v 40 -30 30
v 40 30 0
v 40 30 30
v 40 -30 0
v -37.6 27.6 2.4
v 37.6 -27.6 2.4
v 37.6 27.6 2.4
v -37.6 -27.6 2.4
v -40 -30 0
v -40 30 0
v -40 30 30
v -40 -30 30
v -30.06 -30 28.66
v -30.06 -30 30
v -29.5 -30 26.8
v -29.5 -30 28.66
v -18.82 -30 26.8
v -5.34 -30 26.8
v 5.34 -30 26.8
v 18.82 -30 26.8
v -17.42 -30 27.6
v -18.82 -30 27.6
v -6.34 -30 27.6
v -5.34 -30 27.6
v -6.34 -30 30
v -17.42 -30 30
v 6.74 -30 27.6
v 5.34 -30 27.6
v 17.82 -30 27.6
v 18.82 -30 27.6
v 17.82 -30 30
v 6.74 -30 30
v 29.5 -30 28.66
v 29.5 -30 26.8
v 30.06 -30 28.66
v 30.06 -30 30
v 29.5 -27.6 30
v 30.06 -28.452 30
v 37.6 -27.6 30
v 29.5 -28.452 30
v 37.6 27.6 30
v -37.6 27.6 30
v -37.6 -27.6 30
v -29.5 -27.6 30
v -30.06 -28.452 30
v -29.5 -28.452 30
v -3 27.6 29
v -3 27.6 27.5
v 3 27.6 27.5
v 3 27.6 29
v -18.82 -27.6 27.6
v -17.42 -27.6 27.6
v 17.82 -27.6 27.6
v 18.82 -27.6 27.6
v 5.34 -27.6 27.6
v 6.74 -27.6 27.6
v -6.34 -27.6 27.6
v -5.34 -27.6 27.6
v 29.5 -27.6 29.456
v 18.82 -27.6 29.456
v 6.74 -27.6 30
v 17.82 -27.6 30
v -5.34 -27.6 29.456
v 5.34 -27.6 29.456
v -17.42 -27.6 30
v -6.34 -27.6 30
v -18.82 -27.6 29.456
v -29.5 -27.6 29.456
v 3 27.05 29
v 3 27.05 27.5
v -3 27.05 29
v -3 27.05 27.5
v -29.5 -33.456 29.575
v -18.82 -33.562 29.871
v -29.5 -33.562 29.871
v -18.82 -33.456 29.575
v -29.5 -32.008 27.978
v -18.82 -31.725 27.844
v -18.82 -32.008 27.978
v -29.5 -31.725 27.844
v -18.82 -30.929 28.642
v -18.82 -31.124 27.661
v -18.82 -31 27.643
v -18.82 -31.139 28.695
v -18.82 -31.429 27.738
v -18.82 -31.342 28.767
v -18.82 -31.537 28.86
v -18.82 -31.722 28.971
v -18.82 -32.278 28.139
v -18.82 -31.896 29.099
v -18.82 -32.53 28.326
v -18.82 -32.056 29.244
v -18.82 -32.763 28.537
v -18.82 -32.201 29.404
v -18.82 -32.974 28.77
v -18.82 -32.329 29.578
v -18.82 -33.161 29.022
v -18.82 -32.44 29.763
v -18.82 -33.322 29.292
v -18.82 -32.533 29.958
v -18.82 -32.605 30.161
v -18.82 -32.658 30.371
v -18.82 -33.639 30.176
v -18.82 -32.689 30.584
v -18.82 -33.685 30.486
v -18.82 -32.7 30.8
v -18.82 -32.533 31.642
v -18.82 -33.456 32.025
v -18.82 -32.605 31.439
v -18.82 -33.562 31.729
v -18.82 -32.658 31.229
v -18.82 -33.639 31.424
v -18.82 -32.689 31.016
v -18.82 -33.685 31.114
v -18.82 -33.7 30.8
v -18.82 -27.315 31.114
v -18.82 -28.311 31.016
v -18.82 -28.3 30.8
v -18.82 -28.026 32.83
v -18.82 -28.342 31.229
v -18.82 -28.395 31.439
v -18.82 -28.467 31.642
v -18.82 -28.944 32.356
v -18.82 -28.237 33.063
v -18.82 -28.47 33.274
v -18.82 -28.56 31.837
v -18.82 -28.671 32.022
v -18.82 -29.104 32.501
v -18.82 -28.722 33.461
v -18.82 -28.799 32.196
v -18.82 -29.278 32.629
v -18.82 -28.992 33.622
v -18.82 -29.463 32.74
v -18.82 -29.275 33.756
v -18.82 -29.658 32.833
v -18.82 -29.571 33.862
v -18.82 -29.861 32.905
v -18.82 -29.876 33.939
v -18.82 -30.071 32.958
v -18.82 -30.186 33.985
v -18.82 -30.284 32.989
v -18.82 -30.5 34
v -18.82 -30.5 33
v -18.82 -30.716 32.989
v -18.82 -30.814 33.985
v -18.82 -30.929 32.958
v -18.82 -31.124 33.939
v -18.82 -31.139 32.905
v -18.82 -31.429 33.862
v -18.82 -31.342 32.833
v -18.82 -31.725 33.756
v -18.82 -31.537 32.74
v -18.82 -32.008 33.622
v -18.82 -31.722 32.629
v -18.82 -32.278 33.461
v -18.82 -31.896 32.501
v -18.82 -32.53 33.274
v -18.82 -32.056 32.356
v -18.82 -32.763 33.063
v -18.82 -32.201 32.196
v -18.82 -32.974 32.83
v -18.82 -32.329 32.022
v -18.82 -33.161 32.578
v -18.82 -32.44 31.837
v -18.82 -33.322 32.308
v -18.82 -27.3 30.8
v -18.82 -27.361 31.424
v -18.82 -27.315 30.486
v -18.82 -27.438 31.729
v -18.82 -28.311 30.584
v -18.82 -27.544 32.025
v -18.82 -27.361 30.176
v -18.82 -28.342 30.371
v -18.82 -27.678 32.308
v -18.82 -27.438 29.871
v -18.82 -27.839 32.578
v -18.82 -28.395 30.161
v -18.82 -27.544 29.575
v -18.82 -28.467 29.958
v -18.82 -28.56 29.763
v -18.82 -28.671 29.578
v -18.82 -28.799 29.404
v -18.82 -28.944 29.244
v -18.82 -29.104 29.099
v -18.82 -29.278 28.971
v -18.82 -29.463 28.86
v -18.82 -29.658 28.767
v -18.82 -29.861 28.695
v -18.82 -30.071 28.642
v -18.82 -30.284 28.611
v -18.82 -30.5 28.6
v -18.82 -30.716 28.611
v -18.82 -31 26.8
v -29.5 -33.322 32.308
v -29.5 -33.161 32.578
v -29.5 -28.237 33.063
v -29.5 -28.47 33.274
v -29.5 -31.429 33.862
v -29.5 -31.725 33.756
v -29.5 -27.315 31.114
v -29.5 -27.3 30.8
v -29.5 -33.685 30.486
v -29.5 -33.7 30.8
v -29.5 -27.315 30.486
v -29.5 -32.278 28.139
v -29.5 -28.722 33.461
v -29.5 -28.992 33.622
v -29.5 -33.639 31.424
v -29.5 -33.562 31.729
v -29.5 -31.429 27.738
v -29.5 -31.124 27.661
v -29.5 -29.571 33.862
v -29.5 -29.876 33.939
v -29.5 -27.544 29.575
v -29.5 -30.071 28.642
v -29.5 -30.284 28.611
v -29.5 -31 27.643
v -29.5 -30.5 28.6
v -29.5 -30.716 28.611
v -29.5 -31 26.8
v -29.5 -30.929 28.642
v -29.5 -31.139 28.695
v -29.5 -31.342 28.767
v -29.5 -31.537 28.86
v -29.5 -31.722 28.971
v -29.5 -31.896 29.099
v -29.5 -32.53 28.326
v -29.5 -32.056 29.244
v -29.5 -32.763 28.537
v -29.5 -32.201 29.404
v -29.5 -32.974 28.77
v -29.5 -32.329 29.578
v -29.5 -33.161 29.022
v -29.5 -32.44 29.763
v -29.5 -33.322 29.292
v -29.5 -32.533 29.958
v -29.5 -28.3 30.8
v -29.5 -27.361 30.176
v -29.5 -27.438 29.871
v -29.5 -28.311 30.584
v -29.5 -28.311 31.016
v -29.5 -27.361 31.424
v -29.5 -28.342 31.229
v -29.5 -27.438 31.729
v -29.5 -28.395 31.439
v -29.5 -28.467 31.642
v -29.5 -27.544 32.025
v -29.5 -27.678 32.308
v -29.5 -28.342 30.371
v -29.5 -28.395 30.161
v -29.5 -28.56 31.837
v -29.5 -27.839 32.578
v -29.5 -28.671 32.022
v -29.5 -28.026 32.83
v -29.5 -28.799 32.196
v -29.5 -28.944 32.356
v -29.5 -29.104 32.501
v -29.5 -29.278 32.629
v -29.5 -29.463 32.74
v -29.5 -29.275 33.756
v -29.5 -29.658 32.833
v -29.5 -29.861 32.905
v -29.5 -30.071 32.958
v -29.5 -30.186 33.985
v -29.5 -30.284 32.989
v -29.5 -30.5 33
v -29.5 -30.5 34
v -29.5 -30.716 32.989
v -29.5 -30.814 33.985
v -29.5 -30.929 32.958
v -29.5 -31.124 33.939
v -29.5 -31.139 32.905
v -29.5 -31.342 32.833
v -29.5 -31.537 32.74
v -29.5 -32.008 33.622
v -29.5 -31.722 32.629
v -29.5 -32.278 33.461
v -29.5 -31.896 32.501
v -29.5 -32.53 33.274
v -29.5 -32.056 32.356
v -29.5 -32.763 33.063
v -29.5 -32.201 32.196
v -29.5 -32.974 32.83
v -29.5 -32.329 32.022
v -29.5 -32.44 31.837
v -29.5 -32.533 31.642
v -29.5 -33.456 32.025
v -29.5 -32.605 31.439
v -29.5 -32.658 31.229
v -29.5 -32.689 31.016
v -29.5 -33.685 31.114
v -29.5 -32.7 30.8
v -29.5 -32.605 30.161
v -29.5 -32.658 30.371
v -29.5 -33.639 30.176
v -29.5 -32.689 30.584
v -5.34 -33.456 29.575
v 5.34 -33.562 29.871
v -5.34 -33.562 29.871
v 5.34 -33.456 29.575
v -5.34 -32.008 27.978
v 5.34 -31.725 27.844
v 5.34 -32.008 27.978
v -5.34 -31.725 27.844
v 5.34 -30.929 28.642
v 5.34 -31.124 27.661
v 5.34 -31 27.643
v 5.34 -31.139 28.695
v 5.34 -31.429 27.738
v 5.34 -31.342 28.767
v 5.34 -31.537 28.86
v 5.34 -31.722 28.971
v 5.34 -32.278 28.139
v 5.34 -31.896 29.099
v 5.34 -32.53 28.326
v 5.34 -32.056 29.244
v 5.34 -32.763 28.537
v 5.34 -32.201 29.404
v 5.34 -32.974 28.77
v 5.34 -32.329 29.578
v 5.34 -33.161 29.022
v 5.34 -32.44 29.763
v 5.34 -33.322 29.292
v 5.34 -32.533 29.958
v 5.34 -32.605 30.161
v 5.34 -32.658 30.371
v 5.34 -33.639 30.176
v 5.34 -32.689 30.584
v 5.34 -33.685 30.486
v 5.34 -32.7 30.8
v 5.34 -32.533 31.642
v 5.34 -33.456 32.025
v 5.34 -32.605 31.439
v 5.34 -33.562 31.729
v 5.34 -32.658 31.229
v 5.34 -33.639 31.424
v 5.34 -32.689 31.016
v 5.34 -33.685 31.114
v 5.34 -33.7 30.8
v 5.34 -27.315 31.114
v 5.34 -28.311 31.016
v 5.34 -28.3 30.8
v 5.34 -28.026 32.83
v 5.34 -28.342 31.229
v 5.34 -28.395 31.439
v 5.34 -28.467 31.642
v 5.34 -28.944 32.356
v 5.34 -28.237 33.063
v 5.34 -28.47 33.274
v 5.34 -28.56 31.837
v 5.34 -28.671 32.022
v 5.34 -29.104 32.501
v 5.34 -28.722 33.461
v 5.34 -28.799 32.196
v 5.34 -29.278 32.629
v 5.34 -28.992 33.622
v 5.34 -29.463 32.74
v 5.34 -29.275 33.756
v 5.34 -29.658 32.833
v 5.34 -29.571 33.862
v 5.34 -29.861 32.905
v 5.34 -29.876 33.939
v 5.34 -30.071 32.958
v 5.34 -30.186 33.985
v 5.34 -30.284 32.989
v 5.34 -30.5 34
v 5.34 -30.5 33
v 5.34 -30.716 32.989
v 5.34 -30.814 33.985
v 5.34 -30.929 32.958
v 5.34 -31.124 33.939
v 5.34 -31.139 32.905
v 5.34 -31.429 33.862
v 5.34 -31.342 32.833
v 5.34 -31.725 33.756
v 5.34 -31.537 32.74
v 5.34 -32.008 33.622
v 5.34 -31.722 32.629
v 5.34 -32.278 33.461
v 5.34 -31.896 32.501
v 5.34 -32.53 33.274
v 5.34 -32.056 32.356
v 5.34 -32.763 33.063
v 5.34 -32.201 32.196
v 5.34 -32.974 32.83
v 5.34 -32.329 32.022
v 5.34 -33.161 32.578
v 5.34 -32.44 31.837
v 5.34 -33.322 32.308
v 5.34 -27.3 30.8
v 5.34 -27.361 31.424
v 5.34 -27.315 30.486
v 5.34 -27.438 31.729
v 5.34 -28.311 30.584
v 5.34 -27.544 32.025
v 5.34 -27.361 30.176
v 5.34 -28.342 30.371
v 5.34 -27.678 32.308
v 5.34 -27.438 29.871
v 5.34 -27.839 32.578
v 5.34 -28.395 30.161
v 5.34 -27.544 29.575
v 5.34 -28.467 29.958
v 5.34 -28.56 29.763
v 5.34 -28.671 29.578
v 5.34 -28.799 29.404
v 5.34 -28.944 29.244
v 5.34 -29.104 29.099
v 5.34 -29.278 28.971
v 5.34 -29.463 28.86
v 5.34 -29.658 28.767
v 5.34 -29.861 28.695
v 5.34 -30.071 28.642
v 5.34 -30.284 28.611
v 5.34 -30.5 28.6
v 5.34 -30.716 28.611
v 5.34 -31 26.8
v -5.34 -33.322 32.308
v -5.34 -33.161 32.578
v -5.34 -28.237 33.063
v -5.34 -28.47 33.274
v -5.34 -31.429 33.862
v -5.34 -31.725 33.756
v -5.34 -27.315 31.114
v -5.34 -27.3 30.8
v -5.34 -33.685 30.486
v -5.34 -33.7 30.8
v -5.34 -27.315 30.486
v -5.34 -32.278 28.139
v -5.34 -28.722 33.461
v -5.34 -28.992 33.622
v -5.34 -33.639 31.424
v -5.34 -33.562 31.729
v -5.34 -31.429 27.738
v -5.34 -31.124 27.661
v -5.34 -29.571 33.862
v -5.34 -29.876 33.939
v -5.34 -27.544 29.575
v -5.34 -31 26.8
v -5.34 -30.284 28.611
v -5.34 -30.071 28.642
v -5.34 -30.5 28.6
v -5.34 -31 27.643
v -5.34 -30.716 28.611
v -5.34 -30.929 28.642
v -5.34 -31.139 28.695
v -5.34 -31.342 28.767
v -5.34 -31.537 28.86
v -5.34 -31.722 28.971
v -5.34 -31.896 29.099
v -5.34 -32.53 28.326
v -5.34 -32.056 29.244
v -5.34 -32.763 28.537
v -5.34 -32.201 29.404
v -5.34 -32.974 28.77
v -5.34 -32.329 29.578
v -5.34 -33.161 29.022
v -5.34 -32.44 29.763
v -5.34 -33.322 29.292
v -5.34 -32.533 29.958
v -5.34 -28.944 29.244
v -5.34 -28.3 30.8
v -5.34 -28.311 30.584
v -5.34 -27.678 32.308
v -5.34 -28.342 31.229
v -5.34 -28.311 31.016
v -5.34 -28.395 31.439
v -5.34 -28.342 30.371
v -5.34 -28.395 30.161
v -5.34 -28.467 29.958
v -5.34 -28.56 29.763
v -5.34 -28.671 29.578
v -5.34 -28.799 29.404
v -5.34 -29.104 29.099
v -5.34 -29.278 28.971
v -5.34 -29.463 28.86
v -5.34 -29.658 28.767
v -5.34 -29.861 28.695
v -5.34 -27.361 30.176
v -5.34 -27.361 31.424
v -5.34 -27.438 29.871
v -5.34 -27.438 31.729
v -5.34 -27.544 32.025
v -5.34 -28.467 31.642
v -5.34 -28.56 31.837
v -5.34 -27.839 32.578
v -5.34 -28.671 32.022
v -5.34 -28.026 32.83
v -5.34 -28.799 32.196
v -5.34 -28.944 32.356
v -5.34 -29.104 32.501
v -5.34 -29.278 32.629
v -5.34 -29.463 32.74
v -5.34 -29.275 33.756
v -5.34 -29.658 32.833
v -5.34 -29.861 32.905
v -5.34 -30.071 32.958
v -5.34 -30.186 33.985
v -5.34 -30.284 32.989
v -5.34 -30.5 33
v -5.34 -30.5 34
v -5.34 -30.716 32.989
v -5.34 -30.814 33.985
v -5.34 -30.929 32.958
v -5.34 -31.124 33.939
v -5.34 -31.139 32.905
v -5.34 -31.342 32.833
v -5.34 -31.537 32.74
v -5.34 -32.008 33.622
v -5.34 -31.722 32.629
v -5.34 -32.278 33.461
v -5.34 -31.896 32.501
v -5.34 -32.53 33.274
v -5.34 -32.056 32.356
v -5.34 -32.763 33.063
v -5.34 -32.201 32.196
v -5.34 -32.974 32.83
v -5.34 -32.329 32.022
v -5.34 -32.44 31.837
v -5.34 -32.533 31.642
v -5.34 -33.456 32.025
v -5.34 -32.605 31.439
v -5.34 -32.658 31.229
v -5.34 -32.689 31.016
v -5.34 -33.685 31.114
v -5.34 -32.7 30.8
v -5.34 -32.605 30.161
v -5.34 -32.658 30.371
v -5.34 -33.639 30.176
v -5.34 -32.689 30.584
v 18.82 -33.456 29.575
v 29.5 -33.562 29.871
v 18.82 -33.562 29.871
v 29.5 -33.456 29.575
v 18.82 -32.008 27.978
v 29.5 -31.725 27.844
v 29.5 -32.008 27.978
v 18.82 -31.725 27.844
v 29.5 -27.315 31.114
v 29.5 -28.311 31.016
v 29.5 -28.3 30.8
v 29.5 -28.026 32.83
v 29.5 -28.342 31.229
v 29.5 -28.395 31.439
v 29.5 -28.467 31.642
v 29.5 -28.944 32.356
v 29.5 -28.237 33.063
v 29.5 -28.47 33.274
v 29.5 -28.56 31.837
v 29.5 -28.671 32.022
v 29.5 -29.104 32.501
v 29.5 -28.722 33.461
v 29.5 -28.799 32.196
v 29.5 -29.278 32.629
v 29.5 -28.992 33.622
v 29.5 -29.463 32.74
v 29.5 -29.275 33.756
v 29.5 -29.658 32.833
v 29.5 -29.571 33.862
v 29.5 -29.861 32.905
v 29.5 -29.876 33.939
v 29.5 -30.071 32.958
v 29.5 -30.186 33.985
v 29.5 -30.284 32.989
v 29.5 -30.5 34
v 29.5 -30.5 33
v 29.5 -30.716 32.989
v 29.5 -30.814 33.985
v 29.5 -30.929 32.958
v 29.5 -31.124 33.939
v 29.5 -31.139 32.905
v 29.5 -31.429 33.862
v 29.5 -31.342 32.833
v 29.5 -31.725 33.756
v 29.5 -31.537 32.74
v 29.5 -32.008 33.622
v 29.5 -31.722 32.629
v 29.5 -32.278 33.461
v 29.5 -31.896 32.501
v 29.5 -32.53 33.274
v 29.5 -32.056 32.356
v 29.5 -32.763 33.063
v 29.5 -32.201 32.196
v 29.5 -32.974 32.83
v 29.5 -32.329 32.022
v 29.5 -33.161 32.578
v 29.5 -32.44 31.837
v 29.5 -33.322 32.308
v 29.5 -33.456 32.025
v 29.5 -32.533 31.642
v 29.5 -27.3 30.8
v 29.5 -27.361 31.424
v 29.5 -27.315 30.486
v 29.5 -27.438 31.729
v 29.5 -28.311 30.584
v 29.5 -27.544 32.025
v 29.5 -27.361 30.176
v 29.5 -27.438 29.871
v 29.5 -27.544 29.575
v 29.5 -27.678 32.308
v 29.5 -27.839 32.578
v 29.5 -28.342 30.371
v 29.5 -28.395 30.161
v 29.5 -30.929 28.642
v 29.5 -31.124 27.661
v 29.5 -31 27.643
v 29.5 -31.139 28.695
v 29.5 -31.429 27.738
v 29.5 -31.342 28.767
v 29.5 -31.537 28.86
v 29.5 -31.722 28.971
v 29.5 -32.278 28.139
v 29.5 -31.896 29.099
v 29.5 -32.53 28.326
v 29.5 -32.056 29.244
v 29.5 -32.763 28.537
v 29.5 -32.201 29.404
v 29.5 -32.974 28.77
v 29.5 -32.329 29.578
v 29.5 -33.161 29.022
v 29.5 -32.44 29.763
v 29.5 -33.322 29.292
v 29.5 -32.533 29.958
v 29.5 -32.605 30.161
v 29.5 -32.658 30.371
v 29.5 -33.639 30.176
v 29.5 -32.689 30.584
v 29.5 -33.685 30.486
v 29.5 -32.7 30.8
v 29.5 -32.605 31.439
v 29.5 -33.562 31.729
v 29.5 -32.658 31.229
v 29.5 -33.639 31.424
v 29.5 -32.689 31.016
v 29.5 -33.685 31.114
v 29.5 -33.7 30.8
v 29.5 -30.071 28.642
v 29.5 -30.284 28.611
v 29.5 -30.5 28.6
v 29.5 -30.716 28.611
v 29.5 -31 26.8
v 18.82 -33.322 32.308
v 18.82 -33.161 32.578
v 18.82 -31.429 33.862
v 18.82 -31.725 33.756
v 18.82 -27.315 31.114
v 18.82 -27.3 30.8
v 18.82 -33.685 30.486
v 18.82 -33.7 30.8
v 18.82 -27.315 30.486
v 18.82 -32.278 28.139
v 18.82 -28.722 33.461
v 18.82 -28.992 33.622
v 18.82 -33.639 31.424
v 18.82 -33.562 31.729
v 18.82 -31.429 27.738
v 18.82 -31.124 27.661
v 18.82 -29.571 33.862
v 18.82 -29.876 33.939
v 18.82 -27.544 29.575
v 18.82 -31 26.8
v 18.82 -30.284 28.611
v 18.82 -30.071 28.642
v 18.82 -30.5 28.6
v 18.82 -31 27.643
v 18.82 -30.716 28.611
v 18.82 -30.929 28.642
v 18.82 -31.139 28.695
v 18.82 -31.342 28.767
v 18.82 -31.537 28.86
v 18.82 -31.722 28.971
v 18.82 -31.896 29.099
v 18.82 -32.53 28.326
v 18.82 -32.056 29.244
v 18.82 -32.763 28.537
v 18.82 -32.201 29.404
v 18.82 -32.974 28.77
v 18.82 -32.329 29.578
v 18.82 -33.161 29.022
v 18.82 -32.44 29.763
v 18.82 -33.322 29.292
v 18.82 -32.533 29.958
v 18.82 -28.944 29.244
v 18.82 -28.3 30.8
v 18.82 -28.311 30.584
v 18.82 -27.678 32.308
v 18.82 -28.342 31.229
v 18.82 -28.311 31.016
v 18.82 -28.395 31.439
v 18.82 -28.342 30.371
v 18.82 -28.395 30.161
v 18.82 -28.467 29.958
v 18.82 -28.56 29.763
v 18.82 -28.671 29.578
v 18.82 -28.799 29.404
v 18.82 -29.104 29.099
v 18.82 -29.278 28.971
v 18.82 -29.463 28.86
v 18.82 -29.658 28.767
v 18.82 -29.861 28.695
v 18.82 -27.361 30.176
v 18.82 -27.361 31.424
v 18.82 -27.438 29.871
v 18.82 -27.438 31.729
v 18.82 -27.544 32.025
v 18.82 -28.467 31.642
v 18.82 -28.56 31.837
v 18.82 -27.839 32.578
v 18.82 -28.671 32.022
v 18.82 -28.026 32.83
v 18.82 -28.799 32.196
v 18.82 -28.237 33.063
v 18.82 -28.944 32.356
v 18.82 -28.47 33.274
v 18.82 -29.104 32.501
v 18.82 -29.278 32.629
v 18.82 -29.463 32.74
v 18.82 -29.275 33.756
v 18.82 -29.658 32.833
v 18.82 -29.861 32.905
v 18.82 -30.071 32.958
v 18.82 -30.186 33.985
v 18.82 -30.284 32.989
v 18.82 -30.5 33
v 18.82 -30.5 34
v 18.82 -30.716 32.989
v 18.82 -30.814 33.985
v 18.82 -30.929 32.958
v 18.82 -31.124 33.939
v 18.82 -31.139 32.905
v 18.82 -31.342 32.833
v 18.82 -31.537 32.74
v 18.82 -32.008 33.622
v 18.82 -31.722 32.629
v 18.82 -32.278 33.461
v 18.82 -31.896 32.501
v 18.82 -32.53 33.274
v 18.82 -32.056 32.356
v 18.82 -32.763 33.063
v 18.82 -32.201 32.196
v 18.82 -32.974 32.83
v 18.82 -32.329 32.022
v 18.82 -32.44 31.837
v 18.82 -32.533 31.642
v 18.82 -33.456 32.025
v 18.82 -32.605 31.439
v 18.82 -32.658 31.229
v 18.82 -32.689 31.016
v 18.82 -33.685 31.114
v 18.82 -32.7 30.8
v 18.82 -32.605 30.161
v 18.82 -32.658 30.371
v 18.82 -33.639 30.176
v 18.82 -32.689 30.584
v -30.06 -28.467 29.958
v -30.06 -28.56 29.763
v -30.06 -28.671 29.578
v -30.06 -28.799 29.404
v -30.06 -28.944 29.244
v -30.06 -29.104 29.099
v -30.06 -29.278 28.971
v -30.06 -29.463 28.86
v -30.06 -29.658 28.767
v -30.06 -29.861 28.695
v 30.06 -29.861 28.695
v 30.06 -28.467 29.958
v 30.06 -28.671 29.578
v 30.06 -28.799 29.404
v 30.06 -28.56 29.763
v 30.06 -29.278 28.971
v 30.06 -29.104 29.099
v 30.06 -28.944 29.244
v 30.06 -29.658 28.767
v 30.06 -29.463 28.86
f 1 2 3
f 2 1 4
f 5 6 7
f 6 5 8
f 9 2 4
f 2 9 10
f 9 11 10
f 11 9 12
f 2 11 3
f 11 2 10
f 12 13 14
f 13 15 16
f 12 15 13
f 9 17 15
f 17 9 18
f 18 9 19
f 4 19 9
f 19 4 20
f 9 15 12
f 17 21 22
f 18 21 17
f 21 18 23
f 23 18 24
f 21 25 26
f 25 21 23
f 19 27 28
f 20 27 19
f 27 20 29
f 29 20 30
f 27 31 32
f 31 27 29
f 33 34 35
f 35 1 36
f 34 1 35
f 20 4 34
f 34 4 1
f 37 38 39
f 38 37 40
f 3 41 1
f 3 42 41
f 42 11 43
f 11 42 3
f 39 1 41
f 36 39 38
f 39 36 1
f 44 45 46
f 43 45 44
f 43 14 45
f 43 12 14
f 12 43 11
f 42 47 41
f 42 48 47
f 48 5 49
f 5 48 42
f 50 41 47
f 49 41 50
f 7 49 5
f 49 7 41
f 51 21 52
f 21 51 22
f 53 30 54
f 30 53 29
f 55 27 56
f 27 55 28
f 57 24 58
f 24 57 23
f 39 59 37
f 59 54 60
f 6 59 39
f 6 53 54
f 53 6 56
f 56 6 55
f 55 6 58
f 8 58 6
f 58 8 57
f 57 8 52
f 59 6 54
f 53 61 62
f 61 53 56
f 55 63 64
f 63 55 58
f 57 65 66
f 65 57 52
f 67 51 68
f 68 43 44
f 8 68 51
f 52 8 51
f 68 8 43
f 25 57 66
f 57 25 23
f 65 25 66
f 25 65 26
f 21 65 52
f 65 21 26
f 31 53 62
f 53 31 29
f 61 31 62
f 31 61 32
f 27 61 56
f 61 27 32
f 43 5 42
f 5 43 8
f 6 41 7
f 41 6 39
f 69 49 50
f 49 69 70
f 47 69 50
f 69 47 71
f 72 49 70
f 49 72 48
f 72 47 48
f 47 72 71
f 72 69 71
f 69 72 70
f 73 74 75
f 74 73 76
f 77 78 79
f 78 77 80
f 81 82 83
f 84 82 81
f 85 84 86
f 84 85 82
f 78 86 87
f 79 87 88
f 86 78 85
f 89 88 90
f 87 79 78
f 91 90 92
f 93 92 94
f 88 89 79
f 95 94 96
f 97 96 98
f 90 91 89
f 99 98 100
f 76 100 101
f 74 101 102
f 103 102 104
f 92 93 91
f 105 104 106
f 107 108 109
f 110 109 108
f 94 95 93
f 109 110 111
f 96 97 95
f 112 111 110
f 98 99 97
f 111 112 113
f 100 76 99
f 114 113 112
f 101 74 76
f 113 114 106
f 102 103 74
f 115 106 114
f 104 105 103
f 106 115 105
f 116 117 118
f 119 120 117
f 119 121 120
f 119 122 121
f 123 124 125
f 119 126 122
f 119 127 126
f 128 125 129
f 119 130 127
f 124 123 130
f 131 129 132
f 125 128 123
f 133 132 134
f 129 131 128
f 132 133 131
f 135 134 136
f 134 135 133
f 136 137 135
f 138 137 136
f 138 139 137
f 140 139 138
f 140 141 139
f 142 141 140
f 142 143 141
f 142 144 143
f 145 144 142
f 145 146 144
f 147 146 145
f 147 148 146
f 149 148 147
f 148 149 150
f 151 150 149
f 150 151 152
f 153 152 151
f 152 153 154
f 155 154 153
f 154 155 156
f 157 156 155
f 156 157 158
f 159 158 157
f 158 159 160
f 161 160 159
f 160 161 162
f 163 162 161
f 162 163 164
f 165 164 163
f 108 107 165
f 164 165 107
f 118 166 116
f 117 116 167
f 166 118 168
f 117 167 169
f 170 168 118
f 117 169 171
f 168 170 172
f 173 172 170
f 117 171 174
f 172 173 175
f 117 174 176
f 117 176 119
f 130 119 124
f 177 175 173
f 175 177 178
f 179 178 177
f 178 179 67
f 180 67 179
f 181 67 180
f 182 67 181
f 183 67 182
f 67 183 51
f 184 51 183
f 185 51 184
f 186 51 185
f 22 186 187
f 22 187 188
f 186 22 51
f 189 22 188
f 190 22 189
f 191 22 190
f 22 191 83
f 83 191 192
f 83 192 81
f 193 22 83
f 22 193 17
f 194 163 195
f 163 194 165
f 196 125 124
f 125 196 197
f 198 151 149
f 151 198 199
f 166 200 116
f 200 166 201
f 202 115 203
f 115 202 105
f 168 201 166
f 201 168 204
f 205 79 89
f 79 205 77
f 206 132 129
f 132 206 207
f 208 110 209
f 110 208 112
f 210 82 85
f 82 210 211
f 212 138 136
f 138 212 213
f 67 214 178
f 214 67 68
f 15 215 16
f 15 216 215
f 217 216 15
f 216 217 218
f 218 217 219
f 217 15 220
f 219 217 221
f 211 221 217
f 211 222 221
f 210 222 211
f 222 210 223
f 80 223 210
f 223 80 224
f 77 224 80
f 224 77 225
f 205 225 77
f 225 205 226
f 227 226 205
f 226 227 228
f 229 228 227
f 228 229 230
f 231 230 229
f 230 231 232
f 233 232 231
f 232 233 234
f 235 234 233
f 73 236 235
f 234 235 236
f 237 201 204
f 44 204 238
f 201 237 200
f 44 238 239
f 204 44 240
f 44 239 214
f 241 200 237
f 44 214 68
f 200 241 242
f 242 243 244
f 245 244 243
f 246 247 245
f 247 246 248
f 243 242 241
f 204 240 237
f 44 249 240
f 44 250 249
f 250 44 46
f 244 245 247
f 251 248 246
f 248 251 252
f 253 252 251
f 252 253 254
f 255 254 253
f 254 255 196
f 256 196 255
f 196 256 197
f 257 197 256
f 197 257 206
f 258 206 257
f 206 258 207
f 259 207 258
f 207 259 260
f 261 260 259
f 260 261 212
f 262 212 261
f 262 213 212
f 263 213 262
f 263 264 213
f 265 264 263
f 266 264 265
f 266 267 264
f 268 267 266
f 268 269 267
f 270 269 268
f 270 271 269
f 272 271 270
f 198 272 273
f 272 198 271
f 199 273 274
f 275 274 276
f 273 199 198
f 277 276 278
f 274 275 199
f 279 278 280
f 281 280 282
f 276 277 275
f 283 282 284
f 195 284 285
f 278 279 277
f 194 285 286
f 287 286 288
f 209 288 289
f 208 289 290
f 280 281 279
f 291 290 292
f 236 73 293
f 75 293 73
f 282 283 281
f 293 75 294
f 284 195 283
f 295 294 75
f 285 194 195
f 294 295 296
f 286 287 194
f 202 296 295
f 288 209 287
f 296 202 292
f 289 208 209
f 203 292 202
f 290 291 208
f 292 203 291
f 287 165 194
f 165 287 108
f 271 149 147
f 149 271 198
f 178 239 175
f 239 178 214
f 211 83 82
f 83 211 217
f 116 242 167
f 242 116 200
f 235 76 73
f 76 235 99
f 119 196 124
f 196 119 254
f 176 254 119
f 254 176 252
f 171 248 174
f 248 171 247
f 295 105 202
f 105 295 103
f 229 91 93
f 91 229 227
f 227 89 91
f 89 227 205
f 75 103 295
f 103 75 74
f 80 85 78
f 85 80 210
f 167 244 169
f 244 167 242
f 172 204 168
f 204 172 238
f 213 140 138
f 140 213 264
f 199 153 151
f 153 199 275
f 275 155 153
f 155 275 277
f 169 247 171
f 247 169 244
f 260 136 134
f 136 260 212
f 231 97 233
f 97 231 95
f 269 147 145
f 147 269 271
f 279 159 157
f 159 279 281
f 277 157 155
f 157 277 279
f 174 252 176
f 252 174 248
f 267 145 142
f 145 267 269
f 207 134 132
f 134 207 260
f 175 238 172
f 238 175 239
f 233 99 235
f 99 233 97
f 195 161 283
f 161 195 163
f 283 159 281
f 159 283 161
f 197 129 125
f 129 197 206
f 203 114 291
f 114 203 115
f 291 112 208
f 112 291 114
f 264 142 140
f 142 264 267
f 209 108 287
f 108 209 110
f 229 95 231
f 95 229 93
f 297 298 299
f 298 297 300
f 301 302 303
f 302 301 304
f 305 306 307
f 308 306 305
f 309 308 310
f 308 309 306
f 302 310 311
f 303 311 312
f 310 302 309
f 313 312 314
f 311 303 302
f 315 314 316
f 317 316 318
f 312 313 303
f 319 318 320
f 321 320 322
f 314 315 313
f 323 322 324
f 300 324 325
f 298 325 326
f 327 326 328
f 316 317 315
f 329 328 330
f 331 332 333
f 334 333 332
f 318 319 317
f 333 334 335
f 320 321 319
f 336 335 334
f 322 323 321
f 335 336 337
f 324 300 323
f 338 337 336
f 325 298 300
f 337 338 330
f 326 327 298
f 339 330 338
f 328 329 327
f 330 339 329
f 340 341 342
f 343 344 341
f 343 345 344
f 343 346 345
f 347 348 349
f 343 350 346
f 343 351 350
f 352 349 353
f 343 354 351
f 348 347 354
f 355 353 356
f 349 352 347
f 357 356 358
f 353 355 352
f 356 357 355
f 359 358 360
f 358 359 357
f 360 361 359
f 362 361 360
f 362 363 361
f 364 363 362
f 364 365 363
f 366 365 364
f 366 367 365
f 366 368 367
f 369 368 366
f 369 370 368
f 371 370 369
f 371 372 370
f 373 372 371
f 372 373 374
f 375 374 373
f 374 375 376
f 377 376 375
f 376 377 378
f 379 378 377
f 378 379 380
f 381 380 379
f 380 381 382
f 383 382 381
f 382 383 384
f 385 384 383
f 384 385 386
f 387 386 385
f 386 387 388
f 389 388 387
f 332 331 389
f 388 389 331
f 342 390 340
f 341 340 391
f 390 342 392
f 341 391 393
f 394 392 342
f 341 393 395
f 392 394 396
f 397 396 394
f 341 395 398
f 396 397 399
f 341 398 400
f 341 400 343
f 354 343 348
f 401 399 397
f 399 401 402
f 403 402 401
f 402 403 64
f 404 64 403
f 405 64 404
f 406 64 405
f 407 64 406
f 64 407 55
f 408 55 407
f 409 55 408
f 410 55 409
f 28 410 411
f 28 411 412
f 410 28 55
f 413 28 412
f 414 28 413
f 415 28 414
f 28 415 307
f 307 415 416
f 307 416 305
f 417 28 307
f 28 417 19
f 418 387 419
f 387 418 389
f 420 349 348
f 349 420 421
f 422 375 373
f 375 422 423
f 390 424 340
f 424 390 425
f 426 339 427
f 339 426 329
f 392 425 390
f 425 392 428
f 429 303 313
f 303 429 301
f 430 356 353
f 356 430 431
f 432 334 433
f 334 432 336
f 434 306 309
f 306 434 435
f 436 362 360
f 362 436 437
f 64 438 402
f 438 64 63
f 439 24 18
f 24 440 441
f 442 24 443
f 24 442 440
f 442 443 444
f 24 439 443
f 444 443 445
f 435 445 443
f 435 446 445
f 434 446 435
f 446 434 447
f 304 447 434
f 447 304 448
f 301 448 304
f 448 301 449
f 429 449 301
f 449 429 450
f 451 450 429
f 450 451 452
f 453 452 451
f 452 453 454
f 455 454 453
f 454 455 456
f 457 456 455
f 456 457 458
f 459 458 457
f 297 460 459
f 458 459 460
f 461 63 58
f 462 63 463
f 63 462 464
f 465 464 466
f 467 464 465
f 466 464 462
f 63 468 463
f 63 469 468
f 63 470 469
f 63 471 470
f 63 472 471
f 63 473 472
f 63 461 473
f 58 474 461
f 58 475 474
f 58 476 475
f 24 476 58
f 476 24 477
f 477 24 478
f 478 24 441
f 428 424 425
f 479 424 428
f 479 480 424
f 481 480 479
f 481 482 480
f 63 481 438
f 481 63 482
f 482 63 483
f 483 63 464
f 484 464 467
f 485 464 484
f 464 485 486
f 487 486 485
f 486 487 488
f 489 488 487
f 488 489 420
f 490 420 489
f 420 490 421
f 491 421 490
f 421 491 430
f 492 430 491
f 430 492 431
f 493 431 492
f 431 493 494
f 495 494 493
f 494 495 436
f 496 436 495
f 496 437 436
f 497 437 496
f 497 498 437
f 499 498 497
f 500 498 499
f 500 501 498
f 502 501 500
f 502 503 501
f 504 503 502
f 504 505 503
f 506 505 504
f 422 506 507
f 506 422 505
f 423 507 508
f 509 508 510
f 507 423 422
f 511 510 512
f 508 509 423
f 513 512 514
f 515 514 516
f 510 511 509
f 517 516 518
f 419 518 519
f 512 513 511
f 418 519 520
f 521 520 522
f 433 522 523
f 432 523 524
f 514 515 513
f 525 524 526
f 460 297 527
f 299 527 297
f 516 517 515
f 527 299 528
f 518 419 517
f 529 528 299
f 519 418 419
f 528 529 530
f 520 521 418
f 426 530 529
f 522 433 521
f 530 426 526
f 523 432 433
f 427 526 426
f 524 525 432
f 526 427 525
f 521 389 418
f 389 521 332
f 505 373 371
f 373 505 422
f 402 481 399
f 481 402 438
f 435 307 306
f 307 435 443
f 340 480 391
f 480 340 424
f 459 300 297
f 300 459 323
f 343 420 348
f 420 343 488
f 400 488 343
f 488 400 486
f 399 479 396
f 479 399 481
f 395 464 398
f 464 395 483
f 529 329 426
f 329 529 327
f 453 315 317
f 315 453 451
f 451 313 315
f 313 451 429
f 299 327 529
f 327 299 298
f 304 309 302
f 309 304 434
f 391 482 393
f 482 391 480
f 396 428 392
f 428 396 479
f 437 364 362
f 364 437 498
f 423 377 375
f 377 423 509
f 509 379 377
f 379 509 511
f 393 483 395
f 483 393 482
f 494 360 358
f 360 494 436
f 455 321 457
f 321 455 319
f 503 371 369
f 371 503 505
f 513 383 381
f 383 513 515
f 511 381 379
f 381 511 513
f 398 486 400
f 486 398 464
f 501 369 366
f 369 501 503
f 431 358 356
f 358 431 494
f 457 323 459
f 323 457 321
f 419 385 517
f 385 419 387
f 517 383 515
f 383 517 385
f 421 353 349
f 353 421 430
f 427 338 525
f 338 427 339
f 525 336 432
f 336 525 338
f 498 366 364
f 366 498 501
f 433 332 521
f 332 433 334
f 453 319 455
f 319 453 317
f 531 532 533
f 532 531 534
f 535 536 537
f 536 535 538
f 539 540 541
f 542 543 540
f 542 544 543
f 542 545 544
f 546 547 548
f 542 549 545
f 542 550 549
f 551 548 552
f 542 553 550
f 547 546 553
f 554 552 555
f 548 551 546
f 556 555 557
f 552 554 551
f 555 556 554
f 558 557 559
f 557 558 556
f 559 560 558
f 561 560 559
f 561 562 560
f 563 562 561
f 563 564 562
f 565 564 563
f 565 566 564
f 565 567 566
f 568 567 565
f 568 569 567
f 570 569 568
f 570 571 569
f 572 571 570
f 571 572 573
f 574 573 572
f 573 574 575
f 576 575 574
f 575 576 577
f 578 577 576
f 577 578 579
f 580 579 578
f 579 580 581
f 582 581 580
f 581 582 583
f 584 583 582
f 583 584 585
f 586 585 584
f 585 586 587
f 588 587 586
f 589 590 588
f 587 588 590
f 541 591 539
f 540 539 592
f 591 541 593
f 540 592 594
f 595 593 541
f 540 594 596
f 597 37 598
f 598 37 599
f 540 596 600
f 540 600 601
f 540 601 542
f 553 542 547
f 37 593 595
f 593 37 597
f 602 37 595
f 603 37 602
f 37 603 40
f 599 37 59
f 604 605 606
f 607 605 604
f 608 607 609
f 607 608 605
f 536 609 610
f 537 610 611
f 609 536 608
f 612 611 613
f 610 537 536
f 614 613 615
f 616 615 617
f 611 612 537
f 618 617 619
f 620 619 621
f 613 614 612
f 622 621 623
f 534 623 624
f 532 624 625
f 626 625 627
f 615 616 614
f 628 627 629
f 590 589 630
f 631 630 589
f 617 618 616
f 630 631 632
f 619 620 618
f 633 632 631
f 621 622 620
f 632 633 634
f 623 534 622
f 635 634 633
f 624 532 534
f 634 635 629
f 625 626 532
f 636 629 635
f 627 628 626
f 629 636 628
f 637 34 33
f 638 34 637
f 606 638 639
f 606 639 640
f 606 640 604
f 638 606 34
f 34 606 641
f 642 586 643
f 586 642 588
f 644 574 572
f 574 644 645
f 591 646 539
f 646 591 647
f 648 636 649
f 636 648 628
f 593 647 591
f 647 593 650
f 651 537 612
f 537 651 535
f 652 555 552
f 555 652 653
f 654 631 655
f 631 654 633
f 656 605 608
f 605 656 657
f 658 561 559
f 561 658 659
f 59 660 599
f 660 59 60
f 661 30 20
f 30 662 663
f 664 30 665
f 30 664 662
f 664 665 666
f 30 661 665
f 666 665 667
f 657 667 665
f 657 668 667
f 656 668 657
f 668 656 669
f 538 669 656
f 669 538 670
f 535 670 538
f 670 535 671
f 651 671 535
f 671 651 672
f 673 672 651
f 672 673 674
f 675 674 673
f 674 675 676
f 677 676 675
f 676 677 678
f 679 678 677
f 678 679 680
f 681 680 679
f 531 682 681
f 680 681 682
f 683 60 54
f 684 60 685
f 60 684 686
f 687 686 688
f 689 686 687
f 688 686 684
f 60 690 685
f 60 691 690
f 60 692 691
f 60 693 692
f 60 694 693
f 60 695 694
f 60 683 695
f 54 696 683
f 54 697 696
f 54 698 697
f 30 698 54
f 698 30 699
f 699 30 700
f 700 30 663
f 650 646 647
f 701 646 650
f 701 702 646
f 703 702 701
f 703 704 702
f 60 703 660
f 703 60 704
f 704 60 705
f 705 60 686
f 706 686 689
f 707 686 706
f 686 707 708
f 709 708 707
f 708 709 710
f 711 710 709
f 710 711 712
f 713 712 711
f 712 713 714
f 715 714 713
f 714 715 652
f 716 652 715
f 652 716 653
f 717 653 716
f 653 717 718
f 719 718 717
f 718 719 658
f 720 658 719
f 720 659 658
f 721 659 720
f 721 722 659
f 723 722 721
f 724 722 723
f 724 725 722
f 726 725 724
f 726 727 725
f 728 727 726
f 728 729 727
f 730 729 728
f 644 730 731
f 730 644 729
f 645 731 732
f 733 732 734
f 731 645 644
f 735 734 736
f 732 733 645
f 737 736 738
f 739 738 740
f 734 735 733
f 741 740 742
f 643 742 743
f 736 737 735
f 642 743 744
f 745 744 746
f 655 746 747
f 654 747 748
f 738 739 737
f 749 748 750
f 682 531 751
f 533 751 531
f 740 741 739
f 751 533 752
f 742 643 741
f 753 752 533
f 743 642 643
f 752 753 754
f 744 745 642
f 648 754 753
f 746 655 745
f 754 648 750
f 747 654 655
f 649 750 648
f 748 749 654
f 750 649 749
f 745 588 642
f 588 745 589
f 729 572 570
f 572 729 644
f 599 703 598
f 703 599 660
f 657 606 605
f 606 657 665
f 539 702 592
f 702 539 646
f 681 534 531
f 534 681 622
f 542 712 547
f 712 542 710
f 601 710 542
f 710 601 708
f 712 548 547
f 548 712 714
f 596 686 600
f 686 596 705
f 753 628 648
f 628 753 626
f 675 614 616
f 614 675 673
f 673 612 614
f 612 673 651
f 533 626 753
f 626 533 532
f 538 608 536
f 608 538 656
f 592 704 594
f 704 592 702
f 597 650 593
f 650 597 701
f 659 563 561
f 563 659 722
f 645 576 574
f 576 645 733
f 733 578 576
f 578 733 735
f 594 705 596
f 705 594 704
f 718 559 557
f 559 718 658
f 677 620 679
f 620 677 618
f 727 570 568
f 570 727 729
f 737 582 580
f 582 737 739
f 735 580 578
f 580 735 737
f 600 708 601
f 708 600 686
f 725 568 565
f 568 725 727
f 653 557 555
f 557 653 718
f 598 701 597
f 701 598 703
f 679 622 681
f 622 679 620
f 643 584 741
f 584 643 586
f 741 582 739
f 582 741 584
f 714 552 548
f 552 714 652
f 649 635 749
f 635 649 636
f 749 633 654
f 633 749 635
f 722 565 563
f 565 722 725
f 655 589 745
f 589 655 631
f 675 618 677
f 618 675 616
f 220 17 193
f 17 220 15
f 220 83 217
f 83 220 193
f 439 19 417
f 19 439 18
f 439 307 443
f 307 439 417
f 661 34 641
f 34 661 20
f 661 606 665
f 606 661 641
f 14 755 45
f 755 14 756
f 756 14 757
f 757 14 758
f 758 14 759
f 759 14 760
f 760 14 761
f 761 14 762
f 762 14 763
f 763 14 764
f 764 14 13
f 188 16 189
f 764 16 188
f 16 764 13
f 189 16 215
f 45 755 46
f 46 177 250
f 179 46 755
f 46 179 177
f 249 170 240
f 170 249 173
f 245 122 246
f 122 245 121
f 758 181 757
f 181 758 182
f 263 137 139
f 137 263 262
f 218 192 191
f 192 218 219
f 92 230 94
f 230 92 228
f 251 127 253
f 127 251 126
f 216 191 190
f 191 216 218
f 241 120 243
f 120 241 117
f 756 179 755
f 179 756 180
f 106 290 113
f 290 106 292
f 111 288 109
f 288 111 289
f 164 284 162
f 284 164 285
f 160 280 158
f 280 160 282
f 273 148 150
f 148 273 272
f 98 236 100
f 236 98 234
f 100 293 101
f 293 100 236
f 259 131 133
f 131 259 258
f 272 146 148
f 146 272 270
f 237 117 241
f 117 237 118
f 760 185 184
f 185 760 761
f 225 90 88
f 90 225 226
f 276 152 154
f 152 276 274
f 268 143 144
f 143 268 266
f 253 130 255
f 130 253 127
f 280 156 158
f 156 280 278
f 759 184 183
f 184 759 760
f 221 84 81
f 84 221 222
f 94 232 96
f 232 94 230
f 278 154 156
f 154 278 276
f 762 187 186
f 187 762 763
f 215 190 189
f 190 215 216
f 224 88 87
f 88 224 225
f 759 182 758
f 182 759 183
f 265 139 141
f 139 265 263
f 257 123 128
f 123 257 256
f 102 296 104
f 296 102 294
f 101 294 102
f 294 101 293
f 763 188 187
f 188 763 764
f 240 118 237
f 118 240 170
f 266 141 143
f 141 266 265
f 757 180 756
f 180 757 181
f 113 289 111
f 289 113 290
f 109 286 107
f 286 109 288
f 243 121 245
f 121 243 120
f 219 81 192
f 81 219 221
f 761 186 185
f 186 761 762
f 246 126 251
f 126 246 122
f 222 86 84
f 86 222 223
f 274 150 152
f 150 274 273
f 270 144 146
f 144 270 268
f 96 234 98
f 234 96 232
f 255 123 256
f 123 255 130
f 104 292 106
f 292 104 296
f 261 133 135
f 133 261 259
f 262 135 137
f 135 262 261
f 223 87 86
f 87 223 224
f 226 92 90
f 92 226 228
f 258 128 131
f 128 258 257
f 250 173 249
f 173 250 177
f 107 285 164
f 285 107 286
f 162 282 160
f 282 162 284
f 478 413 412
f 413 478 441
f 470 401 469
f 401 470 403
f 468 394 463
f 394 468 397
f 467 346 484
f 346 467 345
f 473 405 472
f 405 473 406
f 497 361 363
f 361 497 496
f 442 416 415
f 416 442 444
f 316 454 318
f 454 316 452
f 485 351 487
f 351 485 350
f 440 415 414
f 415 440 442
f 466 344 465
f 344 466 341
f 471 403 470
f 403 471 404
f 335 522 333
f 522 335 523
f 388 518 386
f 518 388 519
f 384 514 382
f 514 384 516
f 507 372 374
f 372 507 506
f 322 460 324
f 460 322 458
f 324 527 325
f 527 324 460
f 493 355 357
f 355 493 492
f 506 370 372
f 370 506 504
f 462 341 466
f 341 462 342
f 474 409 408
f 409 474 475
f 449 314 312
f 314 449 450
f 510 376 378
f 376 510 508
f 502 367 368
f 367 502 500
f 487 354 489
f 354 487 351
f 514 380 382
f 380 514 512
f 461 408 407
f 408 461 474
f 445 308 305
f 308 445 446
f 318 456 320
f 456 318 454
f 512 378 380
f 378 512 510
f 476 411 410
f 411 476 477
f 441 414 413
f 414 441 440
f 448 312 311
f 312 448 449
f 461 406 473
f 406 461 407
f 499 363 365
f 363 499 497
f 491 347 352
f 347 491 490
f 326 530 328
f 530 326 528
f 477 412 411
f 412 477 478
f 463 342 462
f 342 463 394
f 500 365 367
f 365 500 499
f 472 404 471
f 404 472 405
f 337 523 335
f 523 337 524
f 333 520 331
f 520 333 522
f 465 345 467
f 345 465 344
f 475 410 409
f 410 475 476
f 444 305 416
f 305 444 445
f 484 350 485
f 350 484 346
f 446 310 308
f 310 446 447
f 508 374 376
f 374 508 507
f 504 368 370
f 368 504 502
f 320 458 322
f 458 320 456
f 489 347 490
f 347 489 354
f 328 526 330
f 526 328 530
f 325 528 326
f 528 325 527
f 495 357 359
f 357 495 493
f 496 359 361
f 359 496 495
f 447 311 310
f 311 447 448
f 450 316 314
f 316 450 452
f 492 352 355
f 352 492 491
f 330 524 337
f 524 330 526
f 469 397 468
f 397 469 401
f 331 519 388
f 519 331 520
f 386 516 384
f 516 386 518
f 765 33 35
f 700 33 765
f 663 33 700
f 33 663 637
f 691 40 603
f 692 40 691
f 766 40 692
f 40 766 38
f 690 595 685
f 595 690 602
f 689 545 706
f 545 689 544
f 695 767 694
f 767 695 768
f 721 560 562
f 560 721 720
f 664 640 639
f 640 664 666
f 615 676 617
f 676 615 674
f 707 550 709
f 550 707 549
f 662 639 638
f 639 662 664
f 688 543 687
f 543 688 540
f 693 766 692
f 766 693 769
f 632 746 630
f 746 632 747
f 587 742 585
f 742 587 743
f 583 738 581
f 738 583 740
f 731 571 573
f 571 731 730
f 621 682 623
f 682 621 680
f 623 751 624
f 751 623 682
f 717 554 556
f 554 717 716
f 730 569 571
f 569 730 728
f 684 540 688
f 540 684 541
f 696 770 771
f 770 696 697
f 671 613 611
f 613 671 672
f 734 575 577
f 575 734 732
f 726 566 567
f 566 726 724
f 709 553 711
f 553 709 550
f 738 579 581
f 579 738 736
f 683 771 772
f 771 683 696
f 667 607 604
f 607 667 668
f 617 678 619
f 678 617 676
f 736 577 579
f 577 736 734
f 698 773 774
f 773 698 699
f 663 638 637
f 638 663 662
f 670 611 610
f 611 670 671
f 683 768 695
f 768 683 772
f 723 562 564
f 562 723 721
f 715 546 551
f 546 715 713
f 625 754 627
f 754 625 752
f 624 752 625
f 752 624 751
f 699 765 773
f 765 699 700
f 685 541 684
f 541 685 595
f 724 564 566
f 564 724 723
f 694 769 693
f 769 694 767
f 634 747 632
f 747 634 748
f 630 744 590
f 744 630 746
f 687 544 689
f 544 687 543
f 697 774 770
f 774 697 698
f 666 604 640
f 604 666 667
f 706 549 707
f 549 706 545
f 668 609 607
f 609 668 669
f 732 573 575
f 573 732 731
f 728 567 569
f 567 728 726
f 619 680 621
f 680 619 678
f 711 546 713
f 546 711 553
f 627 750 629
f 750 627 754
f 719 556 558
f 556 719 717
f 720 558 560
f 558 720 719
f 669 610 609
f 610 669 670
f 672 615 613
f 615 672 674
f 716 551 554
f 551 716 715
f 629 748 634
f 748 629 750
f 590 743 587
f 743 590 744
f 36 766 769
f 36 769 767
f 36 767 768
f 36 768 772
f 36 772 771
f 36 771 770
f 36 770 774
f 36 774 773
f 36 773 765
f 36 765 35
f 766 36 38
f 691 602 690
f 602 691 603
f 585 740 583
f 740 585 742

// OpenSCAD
// Box with print-in-place hinge (v4: bridge webs to kill band overhangs)
part = "box"; // [box, lid, pin, assembly]
cadverify_only = "";
module instance(name, part, unit = 1) {
    echo(cadverify_instance = [name, part, unit]);
    if (cadverify_only == "" || cadverify_only == name) children();
}

Rkn = 3.2; rbore = 2.2; rpin = 1.9;
yh = -30.5; zh = 30.8;
lid_zh = 3.4;
lid_lift = 27.4;
pin_lift_z = 27.8; pin_shift_y = -30.5;
k0x0=-30; k0x1=-18.32;
k1x0=-17.92; k1x1=-6.24;
k2x0=-5.84; k2x1=5.84;
k3x0=6.24; k3x1=17.92;
k4x0=18.32; k4x1=30;

$fn = 64;

module xcyl(x0, x1, r, y, z) {
    translate([x0, y, z]) rotate([0, 90, 0]) cylinder(r = r, h = x1 - x0);
}

module box_part() {
    difference() {
        union() {
            translate([-40, -30, 0]) cube([80, 60, 2.4]);
            translate([-40, 27.6, 2.4]) cube([80, 2.4, 27.6]);
            translate([-40, -30, 2.4]) cube([80, 2.4, 27.6 - 2.4]);
            // top band of back wall split into segs clearing lid knuckles axially (0.5 gap each side)
            translate([-40, -30, 27.0]) cube([11.68, 2.4, 3.0]);
            translate([-17.42, -30, 27.0]) cube([11.08, 2.4, 3.0]);
            translate([6.74, -30, 27.0]) cube([11.08, 2.4, 3.0]);
            translate([28.32, -30, 27.0]) cube([11.68, 2.4, 3.0]);
            translate([-40, -27.6, 2.4]) cube([2.4, 55.2, 27.6]);
            translate([37.6, -27.6, 2.4]) cube([2.4, 55.2, 27.6]);
            translate([-3, 27.05, 27.5]) cube([6, 0.6, 1.5]);
            // hinge knuckles + support webs tying them to the back wall
            xcyl(k0x0 + 0.5, k0x1 - 0.5, Rkn, yh, zh);
            xcyl(k2x0 + 0.5, k2x1 - 0.5, Rkn, yh, zh);
            xcyl(k4x0 + 0.5, k4x1 - 0.5, Rkn, yh, zh);
            translate([k0x0 + 0.5, -31, 26.8]) cube([k0x1-k0x0 - 1.0, 3.4, 4.0]);
            translate([k2x0 + 0.5, -31, 26.8]) cube([k2x1-k2x0 - 1.0, 3.4, 4.0]);
            translate([k4x0 + 0.5, -31, 26.8]) cube([k4x1-k4x0 - 1.0, 3.4, 4.0]);
        }
        xcyl(k0x0-0.06, k0x1+0.06, rbore, yh, zh);
        xcyl(k2x0-0.06, k2x1+0.06, rbore, yh, zh);
        xcyl(k4x0-0.06, k4x1+0.06, rbore, yh, zh);
    }
}

module lid_part() {
    difference() {
        union() {
            translate([-40, -30, 10.6]) cube([80, 60, 2.4]);
            translate([-40, 27.6, 3]) cube([80, 2.4, 7.6]);
            translate([-17.92, -30, 3]) cube([11.68, 2.4, 7.6]);
            translate([6.24, -30, 3]) cube([11.68, 2.4, 7.6]);
            translate([-40, -30, 3]) cube([9.4, 2.4, 7.6]);
            translate([-5.34, -30, 3]) cube([10.68, 2.4, 7.6]);
            translate([18.82, -30, 3]) cube([10.68, 2.4, 7.6]);
            translate([30.6, -30, 3]) cube([9.4, 2.4, 7.6]);
            translate([-40, -27.6, 3]) cube([2.4, 55.2, 7.6]);
            translate([37.6, -27.6, 3]) cube([2.4, 55.2, 7.6]);
            translate([-37.2, 25.2, 0]) cube([74.4, 2.0, 10.6]);
            translate([-37.2, -27.2, 0]) cube([74.4, 2.0, 10.6]);
            translate([-37.2, -25.2, 0]) cube([2.0, 50.4, 10.6]);
            translate([35.2, -25.2, 0]) cube([2.0, 50.4, 10.6]);
            xcyl(k1x0 + 0.5, k1x1 - 0.5, Rkn, yh, lid_zh);
            xcyl(k3x0 + 0.5, k3x1 - 0.5, Rkn, yh, lid_zh);
            translate([k1x0 + 0.5, -31, 0]) cube([k1x1-k1x0 - 1.0, 3.4, 5]);
            translate([k3x0 + 0.5, -31, 0]) cube([k3x1-k3x0 - 1.0, 3.4, 5]);
        }
        xcyl(k1x0-0.06, k1x1+0.06, rbore, yh, lid_zh);
        xcyl(k3x0-0.06, k3x1+0.06, rbore, yh, lid_zh);
        translate([-3.25, 26.5, -0.05]) cube([6.5, 1.35, 2.05]);
    }
}

module pin_part() {
    union() {
        xcyl(-32.4, 32.4, 1.8, 0, 3);
        xcyl(31.4, 32.4, 2.8, 0, 3);
        xcyl(-32.4, -31.4, 2.8, 0, 3);
    }
}

if (part == "box") {
    echo(cadverify_spec = [
        ["bounds", [[-40, -33.7, 0], [40, 30, 34.0]]],
        ["bodies", 1],
        ["through_holes", 3],
        ["support_faces", [["bed", "-z", 4000]]],
        ["overhangs_allowed", [["hinge knuckles, bores and wall cutouts print in place", [[-30.2, -33.9, 26.5], [30.2, -27.1, 33.5]]], ["catch bump underside, tiny 3.6 mm2 ledge", [[-3.2, 26.8, 27.3], [3.2, 27.8, 27.7]]]]],
        ["copies", 1],
        ["details", [
            ["floor", "thickness", [0, 0, -1], [0, 0, 1], 2.4],
            ["front_wall", "thickness", [0, 31, 15], [0, -1, 0], 2.4],
            ["cavity", "void", [[-37.6, -27.6, 2.4], [37.6, 27.6, 29.9]], 0.9],
            ["hinge_bore", "hole", [-31, -30.5, 30.8], [1, 0, 0], [[0, 4.4], [11.6, 4.4]]],
            ["catch_bump", "material", [[-3, 27.05, 27.5], [3, 27.6, 29.0]], 0.9],
            ["hinge_view", "view", [[-30, -34, 26.5], [30, -27, 34.5]]]
        ]]
    ]);
    box_part();
} else if (part == "lid") {
    echo(cadverify_spec = [
        ["bounds", [[-40, -33.7, 0], [40, 30, 13]]],
        ["bodies", 1],
        ["through_holes", 2],
        ["support_faces", [["bed", "-z", 300]]],
        ["overhangs_allowed", [
            ["hinge knuckles and bores print in place", [[-18.2, -33.9, 0], [18.2, -27.1, 4.2]]],
            ["lid top bridging over plug cavity", [[-37.2, -24.9, 10.1], [37.2, 25.2, 11.1]]],
            ["lid skirt bottom band, flat 0.4-gap bridge when assembled", [[-40.2, -30.2, 2.8], [40.2, 30.2, 3.2]]],
            ["lid skirt inner ledge over box rim, flat bridge", [[-37.8, -30.2, 10.4], [37.8, 27.8, 10.8]]],
            ["hinge knuckle underside rounds, 0.4-gap print bridge", [[-18.2, -33.9, 3.0], [18.2, -27.1, 6.6]]],
            ["lid back skirt gaps between knuckles, flat bridge", [[-30.6, -30.2, 2.8], [30.6, -27.4, 3.4]]],
            ["notch top face over notch void, tiny bridge", [[-3.5, 26.3, 1.8], [3.5, 28.0, 2.2]]]
        ]],
        ["copies", 1],
        ["details", [
            ["top", "thickness", [0, 0, 14], [0, 0, -1], 2.4],
            ["skirt", "thickness", [0, 31, 6], [0, -1, 0], 2.4],
            ["plug_cavity", "void", [[-35.2, -24.9, 0], [35.2, 25.2, 10.5]], 0.9],
            ["hinge_bore", "hole", [-18.6, -30.5, 3.4], [1, 0, 0], [[0, 4.4], [11.6, 4.4]]],
            ["catch_notch", "void", [[-3.25, 26.5, 0], [3.25, 27.85, 2.0]], 0.9],
            ["catch_view", "view", [[-5, 26.3, 0], [5, 28.5, 3]]]
        ]]
    ]);
    lid_part();
} else if (part == "pin") {
    echo(cadverify_spec = [
        ["bounds", [[-32.4, -3, 0], [32.4, 3, 6]]],
        ["bodies", 1],
        ["support_faces", []],
        ["overhangs_allowed", [["pin shaft underside bridges with 0.3 gap", [[-32.4, -1.9, 0], [32.4, 1.9, 1.6]]]]],
        ["copies", 1],
        ["details", [
            ["shaft", "thickness", [0, 3, 3], [0, -1, 0], 3.6],
            ["head", "material", [[31.4, -2.8, 0], [32.4, 2.8, 6]], 0.7],
            ["pin_view", "view", [[-32.4, -3, 0], [32.4, 3, 6]]]
        ]]
    ]);
    pin_part();
} else if (part == "assembly") {
    echo(cadverify_spec = [
        ["bounds", [[-40, -33.7, 0], [40, 30, 40.4]]],
        ["support_faces", [["bed", "-z", 4000]]],
        ["allowed_interferences", []],
        ["motions", [
            ["lid_open", ["lid"], "rotate", [0, -30.5, 30.8], [1, 0, 0], [0, 110], ["flex", [["lid", "box", 0.5, "catch bump clearance pass"]]]]
        ]],
        ["assembly_order", [
            [["box"], [0, 0, 0]],
            [["lid"], [0, 0, -1]],
            [["pin"], [1, 0, 0]]
        ]],
        ["print_in_place", 0.3],
        ["overhangs_allowed", [
            ["hinge undersides, pin bridge and cutouts in place", [[-33, -34, 26.5], [33, -27, 34.8]]],
            ["lid top bridging over box cavity", [[-37.2, -24.9, 37.5], [37.2, 25.2, 38.5]]],
            ["front lid skirt band over box rim, 0.4 gap flat bridge", [[-40.2, -30.2, 30.2], [40.2, 30.2, 30.6]]],
            ["lid plug bottom face over print gap, flat bridge", [[-37.4, -27.4, 27.2], [37.4, 27.4, 27.6]]],
            ["lid skirt inner ledge over box rim, flat bridge", [[-37.8, -30.2, 37.8], [37.8, 27.8, 38.2]]],
            ["notch top face over notch void, tiny bridge", [[-3.5, 26.3, 29.2], [3.5, 28.0, 29.6]]],
            ["catch bump underside, tiny 3.6 mm2 ledge", [[-3.2, 26.9, 27.3], [3.2, 27.8, 27.7]]]
        ]]
    ]);
    instance("box", "box") box_part();
    instance("lid", "lid") translate([0, 0, lid_lift]) lid_part();
    instance("pin", "pin") translate([0, pin_shift_y, pin_lift_z]) pin_part();
}
